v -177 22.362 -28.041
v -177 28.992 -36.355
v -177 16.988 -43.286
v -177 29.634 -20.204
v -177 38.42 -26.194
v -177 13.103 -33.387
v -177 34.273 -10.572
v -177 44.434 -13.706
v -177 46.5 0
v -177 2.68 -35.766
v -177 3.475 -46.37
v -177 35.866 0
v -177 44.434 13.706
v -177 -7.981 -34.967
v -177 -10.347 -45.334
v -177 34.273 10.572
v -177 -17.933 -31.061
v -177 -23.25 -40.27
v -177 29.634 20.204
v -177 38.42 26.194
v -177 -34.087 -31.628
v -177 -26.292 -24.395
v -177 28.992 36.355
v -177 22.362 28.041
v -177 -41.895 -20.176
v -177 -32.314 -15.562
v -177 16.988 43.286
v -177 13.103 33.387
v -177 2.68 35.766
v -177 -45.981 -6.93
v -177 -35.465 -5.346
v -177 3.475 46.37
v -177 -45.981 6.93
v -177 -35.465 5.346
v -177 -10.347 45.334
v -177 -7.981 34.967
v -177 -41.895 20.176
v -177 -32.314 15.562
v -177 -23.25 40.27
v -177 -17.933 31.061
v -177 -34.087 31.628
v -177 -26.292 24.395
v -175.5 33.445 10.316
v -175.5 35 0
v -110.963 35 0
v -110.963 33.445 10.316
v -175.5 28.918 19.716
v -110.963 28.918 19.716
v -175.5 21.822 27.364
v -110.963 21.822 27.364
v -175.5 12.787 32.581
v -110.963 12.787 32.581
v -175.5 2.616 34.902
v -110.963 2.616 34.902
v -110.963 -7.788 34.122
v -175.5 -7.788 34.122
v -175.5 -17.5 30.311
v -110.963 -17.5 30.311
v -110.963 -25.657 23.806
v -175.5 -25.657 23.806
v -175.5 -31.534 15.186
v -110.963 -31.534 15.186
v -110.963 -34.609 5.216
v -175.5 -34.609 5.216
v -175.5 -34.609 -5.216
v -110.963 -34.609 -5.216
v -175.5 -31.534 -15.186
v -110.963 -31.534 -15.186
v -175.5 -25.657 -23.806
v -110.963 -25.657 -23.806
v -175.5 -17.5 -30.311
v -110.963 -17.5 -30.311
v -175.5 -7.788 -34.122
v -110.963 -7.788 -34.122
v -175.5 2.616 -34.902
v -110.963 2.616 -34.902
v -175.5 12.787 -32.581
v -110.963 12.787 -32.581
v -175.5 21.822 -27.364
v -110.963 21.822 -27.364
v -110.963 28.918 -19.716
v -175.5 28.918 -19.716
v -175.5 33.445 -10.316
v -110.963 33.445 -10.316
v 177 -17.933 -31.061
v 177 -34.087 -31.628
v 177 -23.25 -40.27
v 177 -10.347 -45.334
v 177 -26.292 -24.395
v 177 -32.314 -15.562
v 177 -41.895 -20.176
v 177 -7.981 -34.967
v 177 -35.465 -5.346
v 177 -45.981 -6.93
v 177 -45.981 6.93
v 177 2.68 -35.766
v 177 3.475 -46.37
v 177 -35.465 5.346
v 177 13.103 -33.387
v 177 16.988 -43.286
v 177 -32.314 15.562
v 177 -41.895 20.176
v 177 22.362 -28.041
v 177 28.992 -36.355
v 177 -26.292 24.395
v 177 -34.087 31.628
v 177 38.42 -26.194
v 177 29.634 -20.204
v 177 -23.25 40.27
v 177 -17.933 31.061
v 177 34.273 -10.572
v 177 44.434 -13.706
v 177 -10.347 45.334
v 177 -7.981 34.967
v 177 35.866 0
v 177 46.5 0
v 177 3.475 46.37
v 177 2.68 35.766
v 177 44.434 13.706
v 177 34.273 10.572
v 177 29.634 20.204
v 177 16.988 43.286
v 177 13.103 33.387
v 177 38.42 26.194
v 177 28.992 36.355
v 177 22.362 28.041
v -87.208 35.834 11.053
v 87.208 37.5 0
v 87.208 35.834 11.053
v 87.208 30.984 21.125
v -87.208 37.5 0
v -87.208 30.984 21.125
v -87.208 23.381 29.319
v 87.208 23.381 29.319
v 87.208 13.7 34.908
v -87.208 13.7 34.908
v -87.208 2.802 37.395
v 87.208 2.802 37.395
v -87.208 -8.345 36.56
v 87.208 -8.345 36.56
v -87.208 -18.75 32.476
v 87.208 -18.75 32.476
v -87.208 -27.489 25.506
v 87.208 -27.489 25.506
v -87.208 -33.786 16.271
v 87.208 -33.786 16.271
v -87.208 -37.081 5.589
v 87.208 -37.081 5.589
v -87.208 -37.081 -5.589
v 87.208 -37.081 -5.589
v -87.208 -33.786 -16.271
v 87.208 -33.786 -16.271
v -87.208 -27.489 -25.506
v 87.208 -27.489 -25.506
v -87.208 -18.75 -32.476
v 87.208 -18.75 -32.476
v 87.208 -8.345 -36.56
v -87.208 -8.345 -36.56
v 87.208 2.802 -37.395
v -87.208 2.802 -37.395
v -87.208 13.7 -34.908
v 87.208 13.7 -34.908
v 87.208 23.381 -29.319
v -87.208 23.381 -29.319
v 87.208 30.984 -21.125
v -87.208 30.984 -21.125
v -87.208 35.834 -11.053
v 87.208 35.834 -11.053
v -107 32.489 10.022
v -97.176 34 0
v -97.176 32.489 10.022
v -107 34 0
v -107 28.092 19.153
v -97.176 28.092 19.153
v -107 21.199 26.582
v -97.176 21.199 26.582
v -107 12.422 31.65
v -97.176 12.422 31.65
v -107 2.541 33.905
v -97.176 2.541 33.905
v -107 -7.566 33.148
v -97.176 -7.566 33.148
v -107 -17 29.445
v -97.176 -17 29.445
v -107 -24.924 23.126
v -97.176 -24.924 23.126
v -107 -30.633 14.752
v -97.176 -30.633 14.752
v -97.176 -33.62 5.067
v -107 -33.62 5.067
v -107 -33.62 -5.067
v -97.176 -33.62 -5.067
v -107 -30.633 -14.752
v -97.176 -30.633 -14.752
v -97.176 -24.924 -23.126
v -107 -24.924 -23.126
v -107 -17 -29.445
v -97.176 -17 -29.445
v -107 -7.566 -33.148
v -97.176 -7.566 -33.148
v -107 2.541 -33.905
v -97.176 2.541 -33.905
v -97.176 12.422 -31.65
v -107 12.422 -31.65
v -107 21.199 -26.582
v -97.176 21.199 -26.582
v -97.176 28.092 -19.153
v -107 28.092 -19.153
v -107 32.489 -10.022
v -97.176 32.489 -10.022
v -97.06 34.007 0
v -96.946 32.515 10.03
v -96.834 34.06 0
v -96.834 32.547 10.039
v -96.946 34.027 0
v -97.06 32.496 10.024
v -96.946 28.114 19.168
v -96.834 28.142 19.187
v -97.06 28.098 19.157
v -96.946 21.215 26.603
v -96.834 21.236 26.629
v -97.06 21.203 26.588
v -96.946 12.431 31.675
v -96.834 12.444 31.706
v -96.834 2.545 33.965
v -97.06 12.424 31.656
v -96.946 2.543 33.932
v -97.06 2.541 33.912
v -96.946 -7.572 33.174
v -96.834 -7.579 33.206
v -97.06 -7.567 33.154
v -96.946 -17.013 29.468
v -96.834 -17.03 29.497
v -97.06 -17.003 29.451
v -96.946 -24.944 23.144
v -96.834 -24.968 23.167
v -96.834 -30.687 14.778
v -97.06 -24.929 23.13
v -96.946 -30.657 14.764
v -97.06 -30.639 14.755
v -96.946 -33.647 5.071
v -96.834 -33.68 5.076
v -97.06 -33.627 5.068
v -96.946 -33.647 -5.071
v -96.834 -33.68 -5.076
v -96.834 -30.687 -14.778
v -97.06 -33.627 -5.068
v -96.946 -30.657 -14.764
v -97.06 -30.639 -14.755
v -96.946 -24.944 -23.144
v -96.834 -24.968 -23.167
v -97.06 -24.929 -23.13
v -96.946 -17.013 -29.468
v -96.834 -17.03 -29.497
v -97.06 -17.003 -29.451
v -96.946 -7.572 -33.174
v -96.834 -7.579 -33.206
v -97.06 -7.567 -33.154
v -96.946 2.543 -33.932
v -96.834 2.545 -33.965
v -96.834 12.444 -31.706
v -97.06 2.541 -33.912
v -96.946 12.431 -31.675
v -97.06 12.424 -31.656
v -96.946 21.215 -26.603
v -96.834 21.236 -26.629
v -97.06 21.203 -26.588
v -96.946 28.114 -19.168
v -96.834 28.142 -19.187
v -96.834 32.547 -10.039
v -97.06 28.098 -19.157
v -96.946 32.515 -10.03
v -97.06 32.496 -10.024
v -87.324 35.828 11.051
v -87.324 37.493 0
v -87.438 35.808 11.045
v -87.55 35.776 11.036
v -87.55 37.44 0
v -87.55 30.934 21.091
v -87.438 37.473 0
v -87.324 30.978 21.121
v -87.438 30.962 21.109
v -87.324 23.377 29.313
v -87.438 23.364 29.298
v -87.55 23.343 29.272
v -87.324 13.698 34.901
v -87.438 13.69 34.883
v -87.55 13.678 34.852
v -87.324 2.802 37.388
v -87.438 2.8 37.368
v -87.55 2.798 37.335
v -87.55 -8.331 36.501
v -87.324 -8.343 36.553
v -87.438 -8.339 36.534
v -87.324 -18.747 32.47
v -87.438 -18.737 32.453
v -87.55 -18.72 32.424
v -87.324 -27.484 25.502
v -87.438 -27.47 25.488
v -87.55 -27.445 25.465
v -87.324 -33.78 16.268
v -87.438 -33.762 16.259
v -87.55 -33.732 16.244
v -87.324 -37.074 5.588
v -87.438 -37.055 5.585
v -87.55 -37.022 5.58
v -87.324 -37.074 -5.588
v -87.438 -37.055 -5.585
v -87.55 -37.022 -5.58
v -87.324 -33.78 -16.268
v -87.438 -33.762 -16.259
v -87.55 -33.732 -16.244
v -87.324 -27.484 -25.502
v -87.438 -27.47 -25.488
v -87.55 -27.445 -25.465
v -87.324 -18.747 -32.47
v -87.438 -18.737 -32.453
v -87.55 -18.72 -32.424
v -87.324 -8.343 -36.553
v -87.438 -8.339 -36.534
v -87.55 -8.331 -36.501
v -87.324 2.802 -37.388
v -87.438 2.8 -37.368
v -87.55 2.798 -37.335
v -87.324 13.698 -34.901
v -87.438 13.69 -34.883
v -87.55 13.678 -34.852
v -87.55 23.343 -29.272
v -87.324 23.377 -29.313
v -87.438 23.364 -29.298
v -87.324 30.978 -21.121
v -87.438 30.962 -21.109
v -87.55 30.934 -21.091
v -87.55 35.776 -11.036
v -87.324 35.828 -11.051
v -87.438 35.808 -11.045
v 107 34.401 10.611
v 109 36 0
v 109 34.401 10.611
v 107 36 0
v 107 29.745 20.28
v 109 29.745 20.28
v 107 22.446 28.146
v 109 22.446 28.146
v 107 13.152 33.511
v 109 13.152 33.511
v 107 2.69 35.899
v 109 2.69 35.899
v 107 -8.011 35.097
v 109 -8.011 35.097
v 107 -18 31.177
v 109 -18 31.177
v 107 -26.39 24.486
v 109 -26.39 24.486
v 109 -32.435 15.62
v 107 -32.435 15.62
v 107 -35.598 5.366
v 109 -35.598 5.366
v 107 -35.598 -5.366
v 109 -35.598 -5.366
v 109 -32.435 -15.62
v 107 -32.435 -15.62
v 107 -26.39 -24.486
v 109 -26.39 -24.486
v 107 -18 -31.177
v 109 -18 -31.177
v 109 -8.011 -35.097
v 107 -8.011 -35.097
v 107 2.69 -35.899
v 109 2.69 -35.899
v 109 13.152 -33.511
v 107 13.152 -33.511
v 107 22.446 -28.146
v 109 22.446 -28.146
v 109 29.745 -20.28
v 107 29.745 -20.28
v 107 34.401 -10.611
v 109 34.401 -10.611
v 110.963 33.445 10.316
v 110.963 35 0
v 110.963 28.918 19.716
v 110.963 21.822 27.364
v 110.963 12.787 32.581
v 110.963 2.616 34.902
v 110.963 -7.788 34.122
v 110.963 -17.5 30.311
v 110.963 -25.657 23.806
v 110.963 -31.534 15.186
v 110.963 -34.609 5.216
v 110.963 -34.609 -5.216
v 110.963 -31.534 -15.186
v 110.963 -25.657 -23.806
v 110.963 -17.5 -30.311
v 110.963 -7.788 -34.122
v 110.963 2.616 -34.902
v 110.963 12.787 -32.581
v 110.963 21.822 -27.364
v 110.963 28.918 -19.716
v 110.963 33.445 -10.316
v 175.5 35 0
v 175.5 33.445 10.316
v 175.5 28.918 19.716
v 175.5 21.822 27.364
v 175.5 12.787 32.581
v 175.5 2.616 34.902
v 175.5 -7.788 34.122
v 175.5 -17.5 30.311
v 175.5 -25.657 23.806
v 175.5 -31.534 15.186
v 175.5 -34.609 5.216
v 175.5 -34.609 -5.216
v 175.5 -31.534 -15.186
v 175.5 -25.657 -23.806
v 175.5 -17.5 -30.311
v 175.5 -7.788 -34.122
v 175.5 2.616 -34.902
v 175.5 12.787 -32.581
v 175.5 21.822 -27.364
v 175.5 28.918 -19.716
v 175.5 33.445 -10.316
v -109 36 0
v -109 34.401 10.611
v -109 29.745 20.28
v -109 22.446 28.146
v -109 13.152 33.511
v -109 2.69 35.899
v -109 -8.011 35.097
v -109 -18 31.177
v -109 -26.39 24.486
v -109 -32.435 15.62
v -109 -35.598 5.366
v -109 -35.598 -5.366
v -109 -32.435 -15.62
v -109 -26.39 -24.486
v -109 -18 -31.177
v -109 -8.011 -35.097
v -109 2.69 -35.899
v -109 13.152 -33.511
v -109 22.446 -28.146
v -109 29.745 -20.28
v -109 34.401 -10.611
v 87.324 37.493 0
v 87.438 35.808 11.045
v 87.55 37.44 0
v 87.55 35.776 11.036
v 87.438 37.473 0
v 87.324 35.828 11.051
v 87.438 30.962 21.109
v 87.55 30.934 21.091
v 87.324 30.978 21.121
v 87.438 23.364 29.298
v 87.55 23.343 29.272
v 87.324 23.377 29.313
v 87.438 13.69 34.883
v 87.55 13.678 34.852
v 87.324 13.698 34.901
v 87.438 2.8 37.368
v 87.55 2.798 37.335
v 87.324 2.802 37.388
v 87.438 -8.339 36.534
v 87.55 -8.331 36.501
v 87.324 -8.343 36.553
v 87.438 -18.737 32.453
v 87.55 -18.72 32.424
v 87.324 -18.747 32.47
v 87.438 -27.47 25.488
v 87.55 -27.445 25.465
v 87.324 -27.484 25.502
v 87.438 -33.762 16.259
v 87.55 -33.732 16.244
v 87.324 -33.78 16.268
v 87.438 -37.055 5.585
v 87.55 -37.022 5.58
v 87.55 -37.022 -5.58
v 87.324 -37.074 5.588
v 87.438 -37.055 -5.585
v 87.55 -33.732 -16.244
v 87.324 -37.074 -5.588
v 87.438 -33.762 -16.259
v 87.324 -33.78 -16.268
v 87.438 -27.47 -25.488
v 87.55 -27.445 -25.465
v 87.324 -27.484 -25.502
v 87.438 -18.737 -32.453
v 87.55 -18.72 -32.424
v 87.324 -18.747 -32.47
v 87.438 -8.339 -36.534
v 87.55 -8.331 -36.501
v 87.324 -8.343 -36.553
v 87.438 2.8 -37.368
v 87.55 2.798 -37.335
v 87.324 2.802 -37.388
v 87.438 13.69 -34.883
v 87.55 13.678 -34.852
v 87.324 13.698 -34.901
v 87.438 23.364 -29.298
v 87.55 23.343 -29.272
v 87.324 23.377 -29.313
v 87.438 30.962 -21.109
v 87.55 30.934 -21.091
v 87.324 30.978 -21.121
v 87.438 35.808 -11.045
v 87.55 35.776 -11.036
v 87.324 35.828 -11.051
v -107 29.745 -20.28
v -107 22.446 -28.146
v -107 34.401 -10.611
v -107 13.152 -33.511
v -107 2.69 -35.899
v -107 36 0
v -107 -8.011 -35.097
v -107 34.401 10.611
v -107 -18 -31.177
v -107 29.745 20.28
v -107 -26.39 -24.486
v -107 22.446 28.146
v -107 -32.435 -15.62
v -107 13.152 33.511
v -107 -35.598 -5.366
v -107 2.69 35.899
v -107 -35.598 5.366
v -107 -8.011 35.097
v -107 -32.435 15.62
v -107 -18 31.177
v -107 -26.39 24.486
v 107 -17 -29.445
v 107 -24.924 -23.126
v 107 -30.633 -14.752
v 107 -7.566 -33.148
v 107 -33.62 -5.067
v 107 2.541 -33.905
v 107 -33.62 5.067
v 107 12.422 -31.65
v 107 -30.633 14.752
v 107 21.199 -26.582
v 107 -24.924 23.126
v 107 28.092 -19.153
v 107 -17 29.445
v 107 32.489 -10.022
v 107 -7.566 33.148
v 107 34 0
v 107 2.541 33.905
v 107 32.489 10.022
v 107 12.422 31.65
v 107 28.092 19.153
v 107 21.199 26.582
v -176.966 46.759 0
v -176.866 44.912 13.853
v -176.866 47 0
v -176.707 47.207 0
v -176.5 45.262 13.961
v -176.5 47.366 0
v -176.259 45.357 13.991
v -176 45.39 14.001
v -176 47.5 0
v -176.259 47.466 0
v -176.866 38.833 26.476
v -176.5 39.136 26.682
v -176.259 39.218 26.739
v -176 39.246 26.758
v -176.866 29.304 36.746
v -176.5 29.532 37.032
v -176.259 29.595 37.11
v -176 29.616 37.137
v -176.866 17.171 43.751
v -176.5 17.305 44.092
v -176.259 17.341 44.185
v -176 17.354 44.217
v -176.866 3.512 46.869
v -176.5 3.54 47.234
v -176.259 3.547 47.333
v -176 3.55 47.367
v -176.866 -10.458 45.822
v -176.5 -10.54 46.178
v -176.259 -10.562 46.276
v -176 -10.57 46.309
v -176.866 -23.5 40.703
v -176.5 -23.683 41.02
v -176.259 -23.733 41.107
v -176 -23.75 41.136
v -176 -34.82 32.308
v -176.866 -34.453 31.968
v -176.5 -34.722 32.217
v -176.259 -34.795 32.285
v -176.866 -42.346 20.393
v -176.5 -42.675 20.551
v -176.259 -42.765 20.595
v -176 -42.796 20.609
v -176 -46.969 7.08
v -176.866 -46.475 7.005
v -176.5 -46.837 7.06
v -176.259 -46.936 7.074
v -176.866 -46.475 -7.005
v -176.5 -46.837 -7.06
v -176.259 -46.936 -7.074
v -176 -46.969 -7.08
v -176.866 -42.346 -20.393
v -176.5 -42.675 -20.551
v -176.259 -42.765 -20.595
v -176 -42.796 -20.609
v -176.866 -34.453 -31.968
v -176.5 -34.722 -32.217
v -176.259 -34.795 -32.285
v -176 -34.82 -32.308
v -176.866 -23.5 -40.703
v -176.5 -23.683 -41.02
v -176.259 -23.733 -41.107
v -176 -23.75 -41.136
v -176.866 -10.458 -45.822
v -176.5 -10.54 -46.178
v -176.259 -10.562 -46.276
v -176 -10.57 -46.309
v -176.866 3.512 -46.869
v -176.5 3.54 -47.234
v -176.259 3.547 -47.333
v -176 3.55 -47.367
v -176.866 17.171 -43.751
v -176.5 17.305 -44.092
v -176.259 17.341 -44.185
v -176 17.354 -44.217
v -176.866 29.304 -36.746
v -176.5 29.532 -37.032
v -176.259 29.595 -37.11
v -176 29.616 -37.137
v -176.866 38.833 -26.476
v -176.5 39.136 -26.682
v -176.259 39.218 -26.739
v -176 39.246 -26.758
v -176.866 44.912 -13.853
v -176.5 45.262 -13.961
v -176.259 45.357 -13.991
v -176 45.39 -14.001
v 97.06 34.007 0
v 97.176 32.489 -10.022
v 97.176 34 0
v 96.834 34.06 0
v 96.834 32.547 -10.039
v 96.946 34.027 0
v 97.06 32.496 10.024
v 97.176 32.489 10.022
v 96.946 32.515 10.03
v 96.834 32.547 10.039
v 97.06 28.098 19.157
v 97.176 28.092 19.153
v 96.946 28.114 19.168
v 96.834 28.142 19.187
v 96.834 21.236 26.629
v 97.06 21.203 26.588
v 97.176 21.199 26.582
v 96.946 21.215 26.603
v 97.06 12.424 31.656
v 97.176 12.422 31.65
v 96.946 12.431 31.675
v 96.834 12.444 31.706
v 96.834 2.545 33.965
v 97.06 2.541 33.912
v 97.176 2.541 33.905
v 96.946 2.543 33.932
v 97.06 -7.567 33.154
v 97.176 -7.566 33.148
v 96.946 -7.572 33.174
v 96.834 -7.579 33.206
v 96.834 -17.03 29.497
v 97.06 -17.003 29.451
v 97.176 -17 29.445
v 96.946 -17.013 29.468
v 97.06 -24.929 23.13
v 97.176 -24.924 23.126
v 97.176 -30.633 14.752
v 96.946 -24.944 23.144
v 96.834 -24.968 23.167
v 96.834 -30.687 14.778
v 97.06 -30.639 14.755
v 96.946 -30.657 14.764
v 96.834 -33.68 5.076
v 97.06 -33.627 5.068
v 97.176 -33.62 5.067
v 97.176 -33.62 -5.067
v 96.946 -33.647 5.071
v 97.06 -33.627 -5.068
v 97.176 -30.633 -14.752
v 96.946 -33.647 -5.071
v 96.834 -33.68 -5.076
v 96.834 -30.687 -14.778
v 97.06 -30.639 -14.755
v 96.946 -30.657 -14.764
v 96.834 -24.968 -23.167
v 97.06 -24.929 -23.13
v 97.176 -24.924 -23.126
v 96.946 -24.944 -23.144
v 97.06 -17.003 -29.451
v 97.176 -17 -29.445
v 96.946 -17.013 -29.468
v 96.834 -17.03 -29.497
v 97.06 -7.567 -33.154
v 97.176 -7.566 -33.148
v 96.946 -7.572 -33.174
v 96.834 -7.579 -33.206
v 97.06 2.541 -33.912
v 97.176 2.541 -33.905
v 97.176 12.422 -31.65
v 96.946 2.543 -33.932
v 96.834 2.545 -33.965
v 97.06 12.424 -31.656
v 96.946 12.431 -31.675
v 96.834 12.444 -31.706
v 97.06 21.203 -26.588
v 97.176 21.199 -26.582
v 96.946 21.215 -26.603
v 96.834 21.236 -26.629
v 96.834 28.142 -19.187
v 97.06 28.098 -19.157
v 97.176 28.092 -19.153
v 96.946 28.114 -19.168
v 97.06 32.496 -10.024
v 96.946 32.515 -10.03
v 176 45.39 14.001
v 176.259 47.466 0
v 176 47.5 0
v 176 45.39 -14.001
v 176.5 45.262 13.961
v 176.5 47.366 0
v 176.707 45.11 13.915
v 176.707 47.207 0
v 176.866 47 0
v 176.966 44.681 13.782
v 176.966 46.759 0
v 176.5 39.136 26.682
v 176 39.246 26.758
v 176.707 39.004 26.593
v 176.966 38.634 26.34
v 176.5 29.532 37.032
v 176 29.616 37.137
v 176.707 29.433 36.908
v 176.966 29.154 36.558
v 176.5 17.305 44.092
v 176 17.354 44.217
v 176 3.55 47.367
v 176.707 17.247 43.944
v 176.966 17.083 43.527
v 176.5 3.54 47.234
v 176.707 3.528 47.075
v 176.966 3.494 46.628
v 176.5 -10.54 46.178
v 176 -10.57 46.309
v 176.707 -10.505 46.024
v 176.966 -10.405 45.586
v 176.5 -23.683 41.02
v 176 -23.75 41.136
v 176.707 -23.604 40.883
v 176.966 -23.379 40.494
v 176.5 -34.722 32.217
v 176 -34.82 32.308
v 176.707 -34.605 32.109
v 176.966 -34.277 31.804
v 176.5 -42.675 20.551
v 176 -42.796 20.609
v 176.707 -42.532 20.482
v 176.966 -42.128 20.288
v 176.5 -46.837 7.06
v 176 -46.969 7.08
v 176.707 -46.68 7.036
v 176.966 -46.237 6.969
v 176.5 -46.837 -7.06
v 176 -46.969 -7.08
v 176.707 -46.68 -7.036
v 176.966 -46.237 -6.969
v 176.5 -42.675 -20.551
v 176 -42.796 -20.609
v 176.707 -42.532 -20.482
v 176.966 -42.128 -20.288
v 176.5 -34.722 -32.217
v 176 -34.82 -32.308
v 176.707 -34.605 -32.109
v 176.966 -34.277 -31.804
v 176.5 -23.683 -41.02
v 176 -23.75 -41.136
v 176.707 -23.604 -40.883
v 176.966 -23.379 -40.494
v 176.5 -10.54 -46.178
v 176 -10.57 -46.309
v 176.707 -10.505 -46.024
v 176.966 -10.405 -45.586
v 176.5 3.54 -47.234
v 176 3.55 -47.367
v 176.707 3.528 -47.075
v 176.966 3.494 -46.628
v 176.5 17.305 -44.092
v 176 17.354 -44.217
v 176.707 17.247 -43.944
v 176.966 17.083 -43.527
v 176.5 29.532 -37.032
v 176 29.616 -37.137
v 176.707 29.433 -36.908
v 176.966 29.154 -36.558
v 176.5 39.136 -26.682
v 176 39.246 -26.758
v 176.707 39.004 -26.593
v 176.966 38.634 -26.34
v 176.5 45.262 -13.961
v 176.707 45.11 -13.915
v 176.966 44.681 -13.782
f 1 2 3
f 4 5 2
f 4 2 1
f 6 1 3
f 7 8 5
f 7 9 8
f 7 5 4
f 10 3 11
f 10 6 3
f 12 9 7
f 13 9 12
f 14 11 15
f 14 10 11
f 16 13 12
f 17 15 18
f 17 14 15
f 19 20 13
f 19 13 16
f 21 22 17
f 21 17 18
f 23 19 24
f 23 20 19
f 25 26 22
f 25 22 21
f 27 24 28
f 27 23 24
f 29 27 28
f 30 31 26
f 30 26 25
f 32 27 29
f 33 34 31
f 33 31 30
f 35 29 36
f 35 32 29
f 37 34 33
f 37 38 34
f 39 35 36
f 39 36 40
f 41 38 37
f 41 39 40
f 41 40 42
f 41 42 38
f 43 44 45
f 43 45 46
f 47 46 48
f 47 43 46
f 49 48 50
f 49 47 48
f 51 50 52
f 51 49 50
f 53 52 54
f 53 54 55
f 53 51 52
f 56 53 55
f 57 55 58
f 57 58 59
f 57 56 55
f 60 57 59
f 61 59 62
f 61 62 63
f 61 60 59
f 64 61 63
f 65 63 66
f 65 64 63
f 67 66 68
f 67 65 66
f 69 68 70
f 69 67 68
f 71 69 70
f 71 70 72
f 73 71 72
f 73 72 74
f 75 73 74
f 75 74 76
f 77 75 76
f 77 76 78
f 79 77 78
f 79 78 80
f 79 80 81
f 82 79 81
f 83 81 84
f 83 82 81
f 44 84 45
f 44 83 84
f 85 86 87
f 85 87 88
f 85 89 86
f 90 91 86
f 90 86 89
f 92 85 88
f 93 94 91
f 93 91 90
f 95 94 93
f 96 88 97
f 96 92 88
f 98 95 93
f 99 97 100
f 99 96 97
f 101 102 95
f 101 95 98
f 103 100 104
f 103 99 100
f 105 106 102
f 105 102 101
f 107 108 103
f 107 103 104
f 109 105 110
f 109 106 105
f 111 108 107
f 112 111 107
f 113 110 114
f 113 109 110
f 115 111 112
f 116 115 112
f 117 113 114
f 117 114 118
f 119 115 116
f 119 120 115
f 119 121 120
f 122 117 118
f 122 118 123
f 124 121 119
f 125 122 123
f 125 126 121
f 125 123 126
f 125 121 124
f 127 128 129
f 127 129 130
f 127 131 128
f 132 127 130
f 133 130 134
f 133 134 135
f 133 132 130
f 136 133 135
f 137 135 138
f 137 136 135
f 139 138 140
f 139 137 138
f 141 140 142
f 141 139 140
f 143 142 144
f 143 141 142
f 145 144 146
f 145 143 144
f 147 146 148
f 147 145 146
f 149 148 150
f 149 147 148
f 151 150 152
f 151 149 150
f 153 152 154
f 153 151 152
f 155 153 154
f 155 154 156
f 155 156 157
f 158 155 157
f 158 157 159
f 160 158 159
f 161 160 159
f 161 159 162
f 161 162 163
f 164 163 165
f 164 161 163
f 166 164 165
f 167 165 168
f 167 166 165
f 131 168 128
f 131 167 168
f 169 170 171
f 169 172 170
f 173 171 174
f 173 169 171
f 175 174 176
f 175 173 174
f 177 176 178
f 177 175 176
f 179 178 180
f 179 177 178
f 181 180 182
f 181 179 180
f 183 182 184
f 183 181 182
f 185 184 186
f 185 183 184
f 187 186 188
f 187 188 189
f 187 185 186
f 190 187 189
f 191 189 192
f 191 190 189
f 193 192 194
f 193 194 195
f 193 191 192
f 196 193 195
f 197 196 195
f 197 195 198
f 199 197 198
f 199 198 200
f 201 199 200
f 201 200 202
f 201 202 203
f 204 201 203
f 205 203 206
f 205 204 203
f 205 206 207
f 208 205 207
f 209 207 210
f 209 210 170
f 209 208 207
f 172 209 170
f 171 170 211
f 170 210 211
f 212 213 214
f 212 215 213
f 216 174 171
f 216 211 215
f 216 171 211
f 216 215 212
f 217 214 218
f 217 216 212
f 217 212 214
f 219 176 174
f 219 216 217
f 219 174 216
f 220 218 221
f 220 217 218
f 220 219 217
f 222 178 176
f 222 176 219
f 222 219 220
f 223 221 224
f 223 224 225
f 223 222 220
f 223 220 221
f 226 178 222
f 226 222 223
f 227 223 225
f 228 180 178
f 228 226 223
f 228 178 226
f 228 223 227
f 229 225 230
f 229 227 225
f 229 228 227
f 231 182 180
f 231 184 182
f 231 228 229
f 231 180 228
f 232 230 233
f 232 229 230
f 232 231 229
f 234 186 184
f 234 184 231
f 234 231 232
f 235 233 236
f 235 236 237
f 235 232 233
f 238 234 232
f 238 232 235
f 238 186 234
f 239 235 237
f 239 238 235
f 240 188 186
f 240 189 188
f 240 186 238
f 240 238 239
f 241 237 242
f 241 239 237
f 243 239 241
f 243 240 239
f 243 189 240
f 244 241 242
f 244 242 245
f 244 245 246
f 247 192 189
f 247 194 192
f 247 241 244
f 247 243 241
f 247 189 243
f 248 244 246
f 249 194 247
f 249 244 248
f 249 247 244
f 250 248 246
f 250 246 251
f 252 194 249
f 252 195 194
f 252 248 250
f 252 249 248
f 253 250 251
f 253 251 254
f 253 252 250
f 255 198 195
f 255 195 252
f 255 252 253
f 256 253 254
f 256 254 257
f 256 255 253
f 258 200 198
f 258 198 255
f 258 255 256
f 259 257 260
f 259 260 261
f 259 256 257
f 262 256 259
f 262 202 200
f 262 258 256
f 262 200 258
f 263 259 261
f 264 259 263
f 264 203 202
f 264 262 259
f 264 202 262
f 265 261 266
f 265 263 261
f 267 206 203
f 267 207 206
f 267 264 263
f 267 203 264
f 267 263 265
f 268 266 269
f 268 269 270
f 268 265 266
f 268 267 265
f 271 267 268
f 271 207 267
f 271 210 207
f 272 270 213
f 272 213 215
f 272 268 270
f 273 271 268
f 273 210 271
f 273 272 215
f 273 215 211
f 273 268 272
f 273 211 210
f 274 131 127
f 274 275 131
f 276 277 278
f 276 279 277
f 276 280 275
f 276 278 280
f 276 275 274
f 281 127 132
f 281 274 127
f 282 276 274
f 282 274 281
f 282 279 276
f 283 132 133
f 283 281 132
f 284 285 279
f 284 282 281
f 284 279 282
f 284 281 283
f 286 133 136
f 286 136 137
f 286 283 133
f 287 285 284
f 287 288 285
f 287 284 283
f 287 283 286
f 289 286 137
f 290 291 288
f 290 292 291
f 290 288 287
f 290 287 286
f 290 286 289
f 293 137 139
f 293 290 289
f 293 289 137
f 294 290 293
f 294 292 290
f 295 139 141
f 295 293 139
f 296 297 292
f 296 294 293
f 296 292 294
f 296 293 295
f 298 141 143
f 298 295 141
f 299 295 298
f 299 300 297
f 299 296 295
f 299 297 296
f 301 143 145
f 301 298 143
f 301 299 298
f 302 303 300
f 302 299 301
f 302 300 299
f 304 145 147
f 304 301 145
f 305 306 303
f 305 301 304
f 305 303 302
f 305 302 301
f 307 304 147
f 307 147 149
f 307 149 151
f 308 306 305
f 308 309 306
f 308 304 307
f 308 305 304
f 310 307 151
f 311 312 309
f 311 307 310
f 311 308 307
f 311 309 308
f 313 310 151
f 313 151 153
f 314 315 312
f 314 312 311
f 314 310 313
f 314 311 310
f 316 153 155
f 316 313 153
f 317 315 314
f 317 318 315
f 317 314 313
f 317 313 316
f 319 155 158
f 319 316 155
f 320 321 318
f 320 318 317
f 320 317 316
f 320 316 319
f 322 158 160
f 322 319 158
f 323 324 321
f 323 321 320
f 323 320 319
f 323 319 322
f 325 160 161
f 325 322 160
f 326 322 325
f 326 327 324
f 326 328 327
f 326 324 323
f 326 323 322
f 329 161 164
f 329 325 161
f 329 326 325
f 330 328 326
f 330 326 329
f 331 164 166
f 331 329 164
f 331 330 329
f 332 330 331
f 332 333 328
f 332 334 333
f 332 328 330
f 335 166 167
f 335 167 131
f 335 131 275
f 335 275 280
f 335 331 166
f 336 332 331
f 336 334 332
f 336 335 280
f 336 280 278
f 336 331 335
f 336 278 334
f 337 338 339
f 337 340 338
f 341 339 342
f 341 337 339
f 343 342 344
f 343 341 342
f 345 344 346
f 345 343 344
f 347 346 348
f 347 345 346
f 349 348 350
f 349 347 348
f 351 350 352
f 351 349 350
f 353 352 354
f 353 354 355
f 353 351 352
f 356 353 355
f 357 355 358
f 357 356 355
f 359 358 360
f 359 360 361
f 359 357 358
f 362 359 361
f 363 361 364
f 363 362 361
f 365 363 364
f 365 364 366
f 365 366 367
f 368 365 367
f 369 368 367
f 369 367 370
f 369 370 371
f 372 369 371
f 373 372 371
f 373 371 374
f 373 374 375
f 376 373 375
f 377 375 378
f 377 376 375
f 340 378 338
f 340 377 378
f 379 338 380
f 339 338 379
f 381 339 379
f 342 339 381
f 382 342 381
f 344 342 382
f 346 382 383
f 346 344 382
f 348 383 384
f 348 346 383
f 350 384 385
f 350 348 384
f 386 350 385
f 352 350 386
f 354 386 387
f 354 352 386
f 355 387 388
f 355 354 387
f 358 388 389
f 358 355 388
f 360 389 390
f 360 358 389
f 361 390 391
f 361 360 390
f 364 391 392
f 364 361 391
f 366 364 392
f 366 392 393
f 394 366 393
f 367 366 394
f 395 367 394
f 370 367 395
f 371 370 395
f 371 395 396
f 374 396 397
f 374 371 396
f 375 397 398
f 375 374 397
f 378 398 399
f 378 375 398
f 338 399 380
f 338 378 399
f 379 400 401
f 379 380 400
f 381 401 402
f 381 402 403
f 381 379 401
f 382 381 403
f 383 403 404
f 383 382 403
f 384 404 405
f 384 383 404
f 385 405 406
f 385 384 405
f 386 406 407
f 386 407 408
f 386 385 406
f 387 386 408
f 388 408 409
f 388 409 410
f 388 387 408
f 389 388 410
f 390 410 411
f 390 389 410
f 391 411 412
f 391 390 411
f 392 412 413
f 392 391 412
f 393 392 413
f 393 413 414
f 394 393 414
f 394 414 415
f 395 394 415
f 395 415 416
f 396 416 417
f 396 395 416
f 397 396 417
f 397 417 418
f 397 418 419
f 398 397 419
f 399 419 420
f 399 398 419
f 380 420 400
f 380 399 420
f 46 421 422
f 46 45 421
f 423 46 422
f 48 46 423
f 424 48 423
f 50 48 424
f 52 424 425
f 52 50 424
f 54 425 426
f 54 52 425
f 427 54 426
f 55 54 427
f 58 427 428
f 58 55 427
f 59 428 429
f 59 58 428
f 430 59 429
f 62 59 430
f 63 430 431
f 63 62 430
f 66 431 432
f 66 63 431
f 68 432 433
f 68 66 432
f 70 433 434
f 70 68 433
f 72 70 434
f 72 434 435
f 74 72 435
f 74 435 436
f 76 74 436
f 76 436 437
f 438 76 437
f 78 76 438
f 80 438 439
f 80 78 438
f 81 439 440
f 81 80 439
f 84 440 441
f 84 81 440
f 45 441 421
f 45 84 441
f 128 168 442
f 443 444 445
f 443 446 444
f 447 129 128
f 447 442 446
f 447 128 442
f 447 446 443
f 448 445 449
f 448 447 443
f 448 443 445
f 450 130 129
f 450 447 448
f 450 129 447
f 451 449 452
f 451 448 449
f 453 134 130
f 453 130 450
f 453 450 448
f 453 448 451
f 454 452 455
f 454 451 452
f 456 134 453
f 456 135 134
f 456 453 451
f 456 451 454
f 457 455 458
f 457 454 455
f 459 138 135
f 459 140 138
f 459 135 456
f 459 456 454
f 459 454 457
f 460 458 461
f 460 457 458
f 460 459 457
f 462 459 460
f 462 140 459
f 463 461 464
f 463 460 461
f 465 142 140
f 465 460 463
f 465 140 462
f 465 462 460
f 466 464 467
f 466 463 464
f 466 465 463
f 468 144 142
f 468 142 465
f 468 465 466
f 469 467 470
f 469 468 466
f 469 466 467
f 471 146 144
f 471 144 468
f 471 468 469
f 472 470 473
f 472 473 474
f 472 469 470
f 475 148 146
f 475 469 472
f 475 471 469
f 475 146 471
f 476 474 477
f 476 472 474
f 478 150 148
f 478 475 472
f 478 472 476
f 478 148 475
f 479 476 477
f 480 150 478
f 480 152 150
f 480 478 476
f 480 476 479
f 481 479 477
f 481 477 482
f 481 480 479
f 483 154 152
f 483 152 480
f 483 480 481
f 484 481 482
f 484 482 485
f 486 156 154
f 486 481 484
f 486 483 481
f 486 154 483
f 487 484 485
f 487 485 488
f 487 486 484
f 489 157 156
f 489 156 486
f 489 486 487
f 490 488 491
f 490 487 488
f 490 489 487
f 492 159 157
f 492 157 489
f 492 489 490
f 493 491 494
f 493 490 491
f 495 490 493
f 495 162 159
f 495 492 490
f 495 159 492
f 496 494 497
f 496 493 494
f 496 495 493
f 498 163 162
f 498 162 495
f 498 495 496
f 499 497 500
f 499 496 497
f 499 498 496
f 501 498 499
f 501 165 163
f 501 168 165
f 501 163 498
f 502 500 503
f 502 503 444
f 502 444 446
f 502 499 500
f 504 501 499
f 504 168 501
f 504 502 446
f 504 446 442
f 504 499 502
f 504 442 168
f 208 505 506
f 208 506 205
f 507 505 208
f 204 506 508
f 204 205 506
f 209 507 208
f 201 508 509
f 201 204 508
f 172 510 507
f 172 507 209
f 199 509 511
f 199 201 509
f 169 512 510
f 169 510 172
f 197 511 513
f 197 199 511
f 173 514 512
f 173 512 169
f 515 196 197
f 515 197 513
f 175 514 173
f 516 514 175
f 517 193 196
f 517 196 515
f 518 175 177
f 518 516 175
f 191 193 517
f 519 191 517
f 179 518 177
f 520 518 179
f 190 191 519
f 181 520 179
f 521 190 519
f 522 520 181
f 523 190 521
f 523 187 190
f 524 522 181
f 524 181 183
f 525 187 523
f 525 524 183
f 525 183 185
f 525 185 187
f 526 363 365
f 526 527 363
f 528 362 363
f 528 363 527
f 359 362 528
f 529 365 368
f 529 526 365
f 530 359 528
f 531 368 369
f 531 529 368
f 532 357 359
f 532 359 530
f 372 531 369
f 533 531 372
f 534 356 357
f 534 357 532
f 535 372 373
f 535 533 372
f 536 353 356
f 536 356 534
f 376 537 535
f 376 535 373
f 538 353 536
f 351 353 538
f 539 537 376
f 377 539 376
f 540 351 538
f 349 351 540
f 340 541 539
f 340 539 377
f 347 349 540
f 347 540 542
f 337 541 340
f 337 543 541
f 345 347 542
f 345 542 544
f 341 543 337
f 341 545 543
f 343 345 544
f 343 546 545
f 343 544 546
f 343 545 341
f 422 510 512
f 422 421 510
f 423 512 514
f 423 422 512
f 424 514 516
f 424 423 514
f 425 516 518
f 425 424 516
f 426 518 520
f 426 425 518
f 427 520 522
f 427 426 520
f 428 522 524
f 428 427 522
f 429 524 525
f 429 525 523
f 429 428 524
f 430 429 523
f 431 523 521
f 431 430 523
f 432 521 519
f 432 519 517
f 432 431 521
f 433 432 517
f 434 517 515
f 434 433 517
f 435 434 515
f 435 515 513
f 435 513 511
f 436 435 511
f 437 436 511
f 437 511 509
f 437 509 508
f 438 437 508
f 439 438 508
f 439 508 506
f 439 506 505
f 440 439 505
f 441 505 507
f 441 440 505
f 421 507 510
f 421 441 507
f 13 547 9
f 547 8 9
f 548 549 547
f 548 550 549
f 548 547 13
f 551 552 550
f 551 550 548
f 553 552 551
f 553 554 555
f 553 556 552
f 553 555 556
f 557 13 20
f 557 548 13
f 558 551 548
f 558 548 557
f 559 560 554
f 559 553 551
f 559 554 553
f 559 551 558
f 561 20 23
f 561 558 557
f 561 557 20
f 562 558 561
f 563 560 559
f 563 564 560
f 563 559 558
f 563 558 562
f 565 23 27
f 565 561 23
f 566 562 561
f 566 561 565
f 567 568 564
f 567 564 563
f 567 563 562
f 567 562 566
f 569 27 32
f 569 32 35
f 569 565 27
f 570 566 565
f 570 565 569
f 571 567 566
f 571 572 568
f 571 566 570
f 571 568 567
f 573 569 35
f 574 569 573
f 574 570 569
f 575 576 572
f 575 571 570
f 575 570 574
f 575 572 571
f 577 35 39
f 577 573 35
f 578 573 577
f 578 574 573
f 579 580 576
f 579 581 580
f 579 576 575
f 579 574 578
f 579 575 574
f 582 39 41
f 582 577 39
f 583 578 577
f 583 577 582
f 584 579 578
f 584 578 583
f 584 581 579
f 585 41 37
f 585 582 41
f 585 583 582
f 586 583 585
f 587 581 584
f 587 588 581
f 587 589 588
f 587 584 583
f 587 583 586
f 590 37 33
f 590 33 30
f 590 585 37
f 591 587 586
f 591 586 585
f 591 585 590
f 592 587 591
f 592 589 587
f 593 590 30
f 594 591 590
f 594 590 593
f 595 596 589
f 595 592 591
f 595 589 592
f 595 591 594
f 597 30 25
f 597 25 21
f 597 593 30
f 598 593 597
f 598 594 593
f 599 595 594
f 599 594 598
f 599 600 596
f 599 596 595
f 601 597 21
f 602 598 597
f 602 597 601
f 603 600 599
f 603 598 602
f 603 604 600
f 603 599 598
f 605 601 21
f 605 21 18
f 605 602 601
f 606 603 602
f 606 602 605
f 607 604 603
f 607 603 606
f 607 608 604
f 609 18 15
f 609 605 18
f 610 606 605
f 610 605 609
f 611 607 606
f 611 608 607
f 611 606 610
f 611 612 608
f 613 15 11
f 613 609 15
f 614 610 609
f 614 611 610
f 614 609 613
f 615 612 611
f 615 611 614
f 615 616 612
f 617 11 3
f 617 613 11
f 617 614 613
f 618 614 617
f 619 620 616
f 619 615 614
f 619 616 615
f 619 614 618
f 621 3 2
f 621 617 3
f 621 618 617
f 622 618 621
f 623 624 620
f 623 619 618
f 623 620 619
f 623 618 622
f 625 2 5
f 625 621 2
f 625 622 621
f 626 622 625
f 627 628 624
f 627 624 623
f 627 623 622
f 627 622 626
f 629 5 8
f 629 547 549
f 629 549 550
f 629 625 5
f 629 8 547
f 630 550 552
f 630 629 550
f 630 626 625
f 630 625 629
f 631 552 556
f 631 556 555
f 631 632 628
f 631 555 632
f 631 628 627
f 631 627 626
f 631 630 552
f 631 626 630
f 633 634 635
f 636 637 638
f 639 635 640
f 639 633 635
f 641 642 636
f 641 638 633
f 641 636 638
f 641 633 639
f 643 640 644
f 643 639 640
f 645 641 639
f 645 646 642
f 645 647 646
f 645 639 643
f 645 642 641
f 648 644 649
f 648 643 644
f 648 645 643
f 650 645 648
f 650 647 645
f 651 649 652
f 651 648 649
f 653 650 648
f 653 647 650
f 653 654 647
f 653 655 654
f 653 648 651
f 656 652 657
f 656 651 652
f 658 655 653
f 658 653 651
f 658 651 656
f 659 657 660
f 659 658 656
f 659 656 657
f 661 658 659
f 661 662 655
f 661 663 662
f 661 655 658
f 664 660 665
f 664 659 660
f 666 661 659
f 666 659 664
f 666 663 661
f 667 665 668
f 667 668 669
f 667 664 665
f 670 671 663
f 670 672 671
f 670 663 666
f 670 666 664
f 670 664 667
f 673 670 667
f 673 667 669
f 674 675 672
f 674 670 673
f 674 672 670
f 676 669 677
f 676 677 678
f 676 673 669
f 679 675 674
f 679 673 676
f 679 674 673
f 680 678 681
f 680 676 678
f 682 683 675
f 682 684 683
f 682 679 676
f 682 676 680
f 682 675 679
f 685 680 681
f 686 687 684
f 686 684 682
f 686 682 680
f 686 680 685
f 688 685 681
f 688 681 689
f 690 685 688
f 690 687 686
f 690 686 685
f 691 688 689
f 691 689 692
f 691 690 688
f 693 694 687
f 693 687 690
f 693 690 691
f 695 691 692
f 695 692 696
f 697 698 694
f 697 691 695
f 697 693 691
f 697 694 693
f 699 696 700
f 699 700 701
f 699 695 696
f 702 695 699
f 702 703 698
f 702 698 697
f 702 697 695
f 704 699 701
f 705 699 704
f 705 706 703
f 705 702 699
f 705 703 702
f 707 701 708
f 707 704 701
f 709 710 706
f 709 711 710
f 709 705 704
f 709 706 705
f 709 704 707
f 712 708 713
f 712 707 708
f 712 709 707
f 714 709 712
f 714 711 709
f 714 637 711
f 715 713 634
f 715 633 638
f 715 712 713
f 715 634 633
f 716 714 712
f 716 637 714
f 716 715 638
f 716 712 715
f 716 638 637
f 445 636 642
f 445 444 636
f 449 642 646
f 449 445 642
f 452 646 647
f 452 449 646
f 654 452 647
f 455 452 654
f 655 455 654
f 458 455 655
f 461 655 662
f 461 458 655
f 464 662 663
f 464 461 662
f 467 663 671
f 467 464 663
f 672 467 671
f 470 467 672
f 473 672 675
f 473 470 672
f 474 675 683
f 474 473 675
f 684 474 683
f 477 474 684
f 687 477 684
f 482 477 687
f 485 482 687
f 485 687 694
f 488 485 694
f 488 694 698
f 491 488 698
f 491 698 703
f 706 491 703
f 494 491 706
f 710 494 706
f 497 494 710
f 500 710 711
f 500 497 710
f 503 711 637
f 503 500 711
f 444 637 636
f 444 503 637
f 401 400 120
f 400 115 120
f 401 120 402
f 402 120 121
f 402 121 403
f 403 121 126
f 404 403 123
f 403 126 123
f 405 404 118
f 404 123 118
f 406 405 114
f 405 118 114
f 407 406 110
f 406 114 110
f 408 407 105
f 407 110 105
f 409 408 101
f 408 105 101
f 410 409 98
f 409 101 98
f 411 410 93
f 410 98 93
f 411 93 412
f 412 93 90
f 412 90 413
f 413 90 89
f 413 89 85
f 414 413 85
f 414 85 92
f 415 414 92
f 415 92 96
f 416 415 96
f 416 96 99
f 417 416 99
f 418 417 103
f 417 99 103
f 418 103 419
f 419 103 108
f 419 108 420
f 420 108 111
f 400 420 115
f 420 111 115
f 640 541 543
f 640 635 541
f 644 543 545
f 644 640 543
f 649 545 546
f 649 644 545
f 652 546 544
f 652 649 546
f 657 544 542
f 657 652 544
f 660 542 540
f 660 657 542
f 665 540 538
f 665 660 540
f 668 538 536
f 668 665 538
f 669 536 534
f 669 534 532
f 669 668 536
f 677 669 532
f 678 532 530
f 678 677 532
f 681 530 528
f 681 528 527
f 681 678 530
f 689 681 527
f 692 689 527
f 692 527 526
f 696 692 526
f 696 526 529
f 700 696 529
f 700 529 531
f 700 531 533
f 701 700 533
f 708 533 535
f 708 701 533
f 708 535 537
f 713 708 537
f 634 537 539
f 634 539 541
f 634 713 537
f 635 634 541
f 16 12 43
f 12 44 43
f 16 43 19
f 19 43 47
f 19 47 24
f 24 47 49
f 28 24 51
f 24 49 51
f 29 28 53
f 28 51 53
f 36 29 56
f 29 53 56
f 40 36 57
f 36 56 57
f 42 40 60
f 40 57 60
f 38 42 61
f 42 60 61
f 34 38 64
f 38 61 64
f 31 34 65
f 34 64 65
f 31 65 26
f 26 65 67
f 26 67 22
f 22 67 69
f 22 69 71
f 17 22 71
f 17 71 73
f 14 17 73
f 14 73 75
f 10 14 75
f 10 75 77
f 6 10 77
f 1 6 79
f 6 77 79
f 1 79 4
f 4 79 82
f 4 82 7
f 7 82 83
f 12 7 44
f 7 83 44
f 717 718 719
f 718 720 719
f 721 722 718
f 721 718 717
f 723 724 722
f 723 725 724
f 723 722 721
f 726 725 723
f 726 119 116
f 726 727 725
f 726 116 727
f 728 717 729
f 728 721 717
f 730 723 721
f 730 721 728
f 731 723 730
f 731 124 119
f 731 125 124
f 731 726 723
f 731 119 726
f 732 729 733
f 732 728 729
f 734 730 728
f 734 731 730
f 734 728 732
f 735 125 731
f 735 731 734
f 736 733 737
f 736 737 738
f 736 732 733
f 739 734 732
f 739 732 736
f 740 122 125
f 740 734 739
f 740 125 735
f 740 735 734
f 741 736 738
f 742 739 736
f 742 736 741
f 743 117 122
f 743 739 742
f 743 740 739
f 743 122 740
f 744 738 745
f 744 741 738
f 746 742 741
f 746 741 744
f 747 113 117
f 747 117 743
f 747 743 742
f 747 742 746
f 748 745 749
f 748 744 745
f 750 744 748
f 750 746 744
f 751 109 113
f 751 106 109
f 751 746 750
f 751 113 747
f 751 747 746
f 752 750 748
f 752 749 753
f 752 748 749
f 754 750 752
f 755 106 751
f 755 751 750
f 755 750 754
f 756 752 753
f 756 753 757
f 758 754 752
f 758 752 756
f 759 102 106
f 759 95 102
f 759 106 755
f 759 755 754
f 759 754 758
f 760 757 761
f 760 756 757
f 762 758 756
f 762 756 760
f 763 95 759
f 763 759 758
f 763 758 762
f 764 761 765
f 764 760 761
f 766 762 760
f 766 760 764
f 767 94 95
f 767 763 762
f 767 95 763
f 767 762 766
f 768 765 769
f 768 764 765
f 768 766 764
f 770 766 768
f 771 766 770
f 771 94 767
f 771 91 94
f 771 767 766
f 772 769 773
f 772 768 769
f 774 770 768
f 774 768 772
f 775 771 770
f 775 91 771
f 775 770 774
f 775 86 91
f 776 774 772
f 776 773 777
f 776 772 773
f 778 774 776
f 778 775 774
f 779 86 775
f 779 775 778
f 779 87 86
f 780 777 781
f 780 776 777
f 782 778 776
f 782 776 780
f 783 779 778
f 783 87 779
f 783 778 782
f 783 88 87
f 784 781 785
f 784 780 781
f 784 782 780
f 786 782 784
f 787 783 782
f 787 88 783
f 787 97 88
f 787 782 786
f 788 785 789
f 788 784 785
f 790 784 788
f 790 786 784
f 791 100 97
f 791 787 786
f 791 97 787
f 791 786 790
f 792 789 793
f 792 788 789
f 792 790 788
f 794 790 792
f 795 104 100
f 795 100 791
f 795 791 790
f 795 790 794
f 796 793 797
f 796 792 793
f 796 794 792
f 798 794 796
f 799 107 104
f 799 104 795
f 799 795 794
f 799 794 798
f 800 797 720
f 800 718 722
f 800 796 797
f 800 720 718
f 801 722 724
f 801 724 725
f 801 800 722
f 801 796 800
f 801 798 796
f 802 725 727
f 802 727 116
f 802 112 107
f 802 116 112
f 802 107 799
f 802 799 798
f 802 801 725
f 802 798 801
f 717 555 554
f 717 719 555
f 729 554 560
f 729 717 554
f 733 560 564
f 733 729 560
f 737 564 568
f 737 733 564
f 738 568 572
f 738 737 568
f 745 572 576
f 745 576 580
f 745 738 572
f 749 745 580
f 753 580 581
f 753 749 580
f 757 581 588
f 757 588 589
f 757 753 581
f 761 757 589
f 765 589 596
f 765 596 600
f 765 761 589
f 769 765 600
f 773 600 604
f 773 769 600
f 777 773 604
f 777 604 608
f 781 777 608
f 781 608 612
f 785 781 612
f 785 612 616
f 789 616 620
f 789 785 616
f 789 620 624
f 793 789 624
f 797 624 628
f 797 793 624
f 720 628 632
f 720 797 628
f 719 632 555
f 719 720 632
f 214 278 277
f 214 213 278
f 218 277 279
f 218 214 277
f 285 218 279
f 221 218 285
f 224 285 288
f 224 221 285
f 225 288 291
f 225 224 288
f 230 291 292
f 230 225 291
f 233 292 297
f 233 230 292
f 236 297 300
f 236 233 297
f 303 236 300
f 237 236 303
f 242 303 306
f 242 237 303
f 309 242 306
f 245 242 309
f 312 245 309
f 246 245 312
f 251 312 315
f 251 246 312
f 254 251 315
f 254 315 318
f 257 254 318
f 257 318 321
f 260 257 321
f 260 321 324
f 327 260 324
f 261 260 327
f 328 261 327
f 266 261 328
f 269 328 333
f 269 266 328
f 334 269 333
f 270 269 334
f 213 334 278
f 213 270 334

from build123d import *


with BuildPart() as part:
    # Sketch1 → Base-Revolve (revolve)
    with BuildSketch(Plane.XY):
        with BuildLine():
            Line((-177, 35), (-177, 46.5))
            ThreePointArc((-177, 46.5), (-176.707106781, 47.207106781), (-176, 47.5))
            Line((-176, 47.5), (176, 47.5))
            ThreePointArc((176, 47.5), (176.707106781, 47.207106781), (177, 46.5))
            Line((177, 46.5), (177, 35))
            Line((177, 35), (110.962610506, 35))
            Line((110.962610506, 35), (109, 36))
            Line((109, 36), (107, 36))
            Line((107, 36), (107, 34))
            Line((107, 34), (97.176326981, 34))
            ThreePointArc((97.176326981, 34), (97.002678803, 34.015192247), (96.834306837, 34.060307379))
            Line((96.834306837, 34.060307379), (87.549522195, 37.439692621))
            ThreePointArc((87.549522195, 37.439692621), (87.381150229, 37.484807753), (87.207502051, 37.5))
            Line((87.207502051, 37.5), (-87.207502051, 37.5))
            ThreePointArc((-87.207502051, 37.5), (-87.381150229, 37.484807753), (-87.549522195, 37.439692621))
            Line((-87.549522195, 37.439692621), (-96.834306837, 34.060307379))
            ThreePointArc((-96.834306837, 34.060307379), (-97.002678803, 34.015192247), (-97.176326981, 34))
            Line((-97.176326981, 34), (-107, 34))
            Line((-107, 34), (-107, 36))
            Line((-107, 36), (-109, 36))
            Line((-109, 36), (-110.962610506, 35))
            Line((-110.962610506, 35), (-177, 35))
        make_face()
    revolve(axis=Axis((-177, 0, 0), (1, 0, 0)))

    # Sketch5 → Reifning 2.5 x 30 gr (revolve, cut)
    with BuildSketch(Plane.XY):
        Polygon((-177, 35), (-177, 35.866025404), (-175.5, 35), align=None)
        Polygon((177, 35), (175.5, 35), (177, 35.866025404), align=None)
    revolve(axis=Axis((0, 0, 0), (1, 0, 0)), mode=Mode.SUBTRACT)


solid = part.part
